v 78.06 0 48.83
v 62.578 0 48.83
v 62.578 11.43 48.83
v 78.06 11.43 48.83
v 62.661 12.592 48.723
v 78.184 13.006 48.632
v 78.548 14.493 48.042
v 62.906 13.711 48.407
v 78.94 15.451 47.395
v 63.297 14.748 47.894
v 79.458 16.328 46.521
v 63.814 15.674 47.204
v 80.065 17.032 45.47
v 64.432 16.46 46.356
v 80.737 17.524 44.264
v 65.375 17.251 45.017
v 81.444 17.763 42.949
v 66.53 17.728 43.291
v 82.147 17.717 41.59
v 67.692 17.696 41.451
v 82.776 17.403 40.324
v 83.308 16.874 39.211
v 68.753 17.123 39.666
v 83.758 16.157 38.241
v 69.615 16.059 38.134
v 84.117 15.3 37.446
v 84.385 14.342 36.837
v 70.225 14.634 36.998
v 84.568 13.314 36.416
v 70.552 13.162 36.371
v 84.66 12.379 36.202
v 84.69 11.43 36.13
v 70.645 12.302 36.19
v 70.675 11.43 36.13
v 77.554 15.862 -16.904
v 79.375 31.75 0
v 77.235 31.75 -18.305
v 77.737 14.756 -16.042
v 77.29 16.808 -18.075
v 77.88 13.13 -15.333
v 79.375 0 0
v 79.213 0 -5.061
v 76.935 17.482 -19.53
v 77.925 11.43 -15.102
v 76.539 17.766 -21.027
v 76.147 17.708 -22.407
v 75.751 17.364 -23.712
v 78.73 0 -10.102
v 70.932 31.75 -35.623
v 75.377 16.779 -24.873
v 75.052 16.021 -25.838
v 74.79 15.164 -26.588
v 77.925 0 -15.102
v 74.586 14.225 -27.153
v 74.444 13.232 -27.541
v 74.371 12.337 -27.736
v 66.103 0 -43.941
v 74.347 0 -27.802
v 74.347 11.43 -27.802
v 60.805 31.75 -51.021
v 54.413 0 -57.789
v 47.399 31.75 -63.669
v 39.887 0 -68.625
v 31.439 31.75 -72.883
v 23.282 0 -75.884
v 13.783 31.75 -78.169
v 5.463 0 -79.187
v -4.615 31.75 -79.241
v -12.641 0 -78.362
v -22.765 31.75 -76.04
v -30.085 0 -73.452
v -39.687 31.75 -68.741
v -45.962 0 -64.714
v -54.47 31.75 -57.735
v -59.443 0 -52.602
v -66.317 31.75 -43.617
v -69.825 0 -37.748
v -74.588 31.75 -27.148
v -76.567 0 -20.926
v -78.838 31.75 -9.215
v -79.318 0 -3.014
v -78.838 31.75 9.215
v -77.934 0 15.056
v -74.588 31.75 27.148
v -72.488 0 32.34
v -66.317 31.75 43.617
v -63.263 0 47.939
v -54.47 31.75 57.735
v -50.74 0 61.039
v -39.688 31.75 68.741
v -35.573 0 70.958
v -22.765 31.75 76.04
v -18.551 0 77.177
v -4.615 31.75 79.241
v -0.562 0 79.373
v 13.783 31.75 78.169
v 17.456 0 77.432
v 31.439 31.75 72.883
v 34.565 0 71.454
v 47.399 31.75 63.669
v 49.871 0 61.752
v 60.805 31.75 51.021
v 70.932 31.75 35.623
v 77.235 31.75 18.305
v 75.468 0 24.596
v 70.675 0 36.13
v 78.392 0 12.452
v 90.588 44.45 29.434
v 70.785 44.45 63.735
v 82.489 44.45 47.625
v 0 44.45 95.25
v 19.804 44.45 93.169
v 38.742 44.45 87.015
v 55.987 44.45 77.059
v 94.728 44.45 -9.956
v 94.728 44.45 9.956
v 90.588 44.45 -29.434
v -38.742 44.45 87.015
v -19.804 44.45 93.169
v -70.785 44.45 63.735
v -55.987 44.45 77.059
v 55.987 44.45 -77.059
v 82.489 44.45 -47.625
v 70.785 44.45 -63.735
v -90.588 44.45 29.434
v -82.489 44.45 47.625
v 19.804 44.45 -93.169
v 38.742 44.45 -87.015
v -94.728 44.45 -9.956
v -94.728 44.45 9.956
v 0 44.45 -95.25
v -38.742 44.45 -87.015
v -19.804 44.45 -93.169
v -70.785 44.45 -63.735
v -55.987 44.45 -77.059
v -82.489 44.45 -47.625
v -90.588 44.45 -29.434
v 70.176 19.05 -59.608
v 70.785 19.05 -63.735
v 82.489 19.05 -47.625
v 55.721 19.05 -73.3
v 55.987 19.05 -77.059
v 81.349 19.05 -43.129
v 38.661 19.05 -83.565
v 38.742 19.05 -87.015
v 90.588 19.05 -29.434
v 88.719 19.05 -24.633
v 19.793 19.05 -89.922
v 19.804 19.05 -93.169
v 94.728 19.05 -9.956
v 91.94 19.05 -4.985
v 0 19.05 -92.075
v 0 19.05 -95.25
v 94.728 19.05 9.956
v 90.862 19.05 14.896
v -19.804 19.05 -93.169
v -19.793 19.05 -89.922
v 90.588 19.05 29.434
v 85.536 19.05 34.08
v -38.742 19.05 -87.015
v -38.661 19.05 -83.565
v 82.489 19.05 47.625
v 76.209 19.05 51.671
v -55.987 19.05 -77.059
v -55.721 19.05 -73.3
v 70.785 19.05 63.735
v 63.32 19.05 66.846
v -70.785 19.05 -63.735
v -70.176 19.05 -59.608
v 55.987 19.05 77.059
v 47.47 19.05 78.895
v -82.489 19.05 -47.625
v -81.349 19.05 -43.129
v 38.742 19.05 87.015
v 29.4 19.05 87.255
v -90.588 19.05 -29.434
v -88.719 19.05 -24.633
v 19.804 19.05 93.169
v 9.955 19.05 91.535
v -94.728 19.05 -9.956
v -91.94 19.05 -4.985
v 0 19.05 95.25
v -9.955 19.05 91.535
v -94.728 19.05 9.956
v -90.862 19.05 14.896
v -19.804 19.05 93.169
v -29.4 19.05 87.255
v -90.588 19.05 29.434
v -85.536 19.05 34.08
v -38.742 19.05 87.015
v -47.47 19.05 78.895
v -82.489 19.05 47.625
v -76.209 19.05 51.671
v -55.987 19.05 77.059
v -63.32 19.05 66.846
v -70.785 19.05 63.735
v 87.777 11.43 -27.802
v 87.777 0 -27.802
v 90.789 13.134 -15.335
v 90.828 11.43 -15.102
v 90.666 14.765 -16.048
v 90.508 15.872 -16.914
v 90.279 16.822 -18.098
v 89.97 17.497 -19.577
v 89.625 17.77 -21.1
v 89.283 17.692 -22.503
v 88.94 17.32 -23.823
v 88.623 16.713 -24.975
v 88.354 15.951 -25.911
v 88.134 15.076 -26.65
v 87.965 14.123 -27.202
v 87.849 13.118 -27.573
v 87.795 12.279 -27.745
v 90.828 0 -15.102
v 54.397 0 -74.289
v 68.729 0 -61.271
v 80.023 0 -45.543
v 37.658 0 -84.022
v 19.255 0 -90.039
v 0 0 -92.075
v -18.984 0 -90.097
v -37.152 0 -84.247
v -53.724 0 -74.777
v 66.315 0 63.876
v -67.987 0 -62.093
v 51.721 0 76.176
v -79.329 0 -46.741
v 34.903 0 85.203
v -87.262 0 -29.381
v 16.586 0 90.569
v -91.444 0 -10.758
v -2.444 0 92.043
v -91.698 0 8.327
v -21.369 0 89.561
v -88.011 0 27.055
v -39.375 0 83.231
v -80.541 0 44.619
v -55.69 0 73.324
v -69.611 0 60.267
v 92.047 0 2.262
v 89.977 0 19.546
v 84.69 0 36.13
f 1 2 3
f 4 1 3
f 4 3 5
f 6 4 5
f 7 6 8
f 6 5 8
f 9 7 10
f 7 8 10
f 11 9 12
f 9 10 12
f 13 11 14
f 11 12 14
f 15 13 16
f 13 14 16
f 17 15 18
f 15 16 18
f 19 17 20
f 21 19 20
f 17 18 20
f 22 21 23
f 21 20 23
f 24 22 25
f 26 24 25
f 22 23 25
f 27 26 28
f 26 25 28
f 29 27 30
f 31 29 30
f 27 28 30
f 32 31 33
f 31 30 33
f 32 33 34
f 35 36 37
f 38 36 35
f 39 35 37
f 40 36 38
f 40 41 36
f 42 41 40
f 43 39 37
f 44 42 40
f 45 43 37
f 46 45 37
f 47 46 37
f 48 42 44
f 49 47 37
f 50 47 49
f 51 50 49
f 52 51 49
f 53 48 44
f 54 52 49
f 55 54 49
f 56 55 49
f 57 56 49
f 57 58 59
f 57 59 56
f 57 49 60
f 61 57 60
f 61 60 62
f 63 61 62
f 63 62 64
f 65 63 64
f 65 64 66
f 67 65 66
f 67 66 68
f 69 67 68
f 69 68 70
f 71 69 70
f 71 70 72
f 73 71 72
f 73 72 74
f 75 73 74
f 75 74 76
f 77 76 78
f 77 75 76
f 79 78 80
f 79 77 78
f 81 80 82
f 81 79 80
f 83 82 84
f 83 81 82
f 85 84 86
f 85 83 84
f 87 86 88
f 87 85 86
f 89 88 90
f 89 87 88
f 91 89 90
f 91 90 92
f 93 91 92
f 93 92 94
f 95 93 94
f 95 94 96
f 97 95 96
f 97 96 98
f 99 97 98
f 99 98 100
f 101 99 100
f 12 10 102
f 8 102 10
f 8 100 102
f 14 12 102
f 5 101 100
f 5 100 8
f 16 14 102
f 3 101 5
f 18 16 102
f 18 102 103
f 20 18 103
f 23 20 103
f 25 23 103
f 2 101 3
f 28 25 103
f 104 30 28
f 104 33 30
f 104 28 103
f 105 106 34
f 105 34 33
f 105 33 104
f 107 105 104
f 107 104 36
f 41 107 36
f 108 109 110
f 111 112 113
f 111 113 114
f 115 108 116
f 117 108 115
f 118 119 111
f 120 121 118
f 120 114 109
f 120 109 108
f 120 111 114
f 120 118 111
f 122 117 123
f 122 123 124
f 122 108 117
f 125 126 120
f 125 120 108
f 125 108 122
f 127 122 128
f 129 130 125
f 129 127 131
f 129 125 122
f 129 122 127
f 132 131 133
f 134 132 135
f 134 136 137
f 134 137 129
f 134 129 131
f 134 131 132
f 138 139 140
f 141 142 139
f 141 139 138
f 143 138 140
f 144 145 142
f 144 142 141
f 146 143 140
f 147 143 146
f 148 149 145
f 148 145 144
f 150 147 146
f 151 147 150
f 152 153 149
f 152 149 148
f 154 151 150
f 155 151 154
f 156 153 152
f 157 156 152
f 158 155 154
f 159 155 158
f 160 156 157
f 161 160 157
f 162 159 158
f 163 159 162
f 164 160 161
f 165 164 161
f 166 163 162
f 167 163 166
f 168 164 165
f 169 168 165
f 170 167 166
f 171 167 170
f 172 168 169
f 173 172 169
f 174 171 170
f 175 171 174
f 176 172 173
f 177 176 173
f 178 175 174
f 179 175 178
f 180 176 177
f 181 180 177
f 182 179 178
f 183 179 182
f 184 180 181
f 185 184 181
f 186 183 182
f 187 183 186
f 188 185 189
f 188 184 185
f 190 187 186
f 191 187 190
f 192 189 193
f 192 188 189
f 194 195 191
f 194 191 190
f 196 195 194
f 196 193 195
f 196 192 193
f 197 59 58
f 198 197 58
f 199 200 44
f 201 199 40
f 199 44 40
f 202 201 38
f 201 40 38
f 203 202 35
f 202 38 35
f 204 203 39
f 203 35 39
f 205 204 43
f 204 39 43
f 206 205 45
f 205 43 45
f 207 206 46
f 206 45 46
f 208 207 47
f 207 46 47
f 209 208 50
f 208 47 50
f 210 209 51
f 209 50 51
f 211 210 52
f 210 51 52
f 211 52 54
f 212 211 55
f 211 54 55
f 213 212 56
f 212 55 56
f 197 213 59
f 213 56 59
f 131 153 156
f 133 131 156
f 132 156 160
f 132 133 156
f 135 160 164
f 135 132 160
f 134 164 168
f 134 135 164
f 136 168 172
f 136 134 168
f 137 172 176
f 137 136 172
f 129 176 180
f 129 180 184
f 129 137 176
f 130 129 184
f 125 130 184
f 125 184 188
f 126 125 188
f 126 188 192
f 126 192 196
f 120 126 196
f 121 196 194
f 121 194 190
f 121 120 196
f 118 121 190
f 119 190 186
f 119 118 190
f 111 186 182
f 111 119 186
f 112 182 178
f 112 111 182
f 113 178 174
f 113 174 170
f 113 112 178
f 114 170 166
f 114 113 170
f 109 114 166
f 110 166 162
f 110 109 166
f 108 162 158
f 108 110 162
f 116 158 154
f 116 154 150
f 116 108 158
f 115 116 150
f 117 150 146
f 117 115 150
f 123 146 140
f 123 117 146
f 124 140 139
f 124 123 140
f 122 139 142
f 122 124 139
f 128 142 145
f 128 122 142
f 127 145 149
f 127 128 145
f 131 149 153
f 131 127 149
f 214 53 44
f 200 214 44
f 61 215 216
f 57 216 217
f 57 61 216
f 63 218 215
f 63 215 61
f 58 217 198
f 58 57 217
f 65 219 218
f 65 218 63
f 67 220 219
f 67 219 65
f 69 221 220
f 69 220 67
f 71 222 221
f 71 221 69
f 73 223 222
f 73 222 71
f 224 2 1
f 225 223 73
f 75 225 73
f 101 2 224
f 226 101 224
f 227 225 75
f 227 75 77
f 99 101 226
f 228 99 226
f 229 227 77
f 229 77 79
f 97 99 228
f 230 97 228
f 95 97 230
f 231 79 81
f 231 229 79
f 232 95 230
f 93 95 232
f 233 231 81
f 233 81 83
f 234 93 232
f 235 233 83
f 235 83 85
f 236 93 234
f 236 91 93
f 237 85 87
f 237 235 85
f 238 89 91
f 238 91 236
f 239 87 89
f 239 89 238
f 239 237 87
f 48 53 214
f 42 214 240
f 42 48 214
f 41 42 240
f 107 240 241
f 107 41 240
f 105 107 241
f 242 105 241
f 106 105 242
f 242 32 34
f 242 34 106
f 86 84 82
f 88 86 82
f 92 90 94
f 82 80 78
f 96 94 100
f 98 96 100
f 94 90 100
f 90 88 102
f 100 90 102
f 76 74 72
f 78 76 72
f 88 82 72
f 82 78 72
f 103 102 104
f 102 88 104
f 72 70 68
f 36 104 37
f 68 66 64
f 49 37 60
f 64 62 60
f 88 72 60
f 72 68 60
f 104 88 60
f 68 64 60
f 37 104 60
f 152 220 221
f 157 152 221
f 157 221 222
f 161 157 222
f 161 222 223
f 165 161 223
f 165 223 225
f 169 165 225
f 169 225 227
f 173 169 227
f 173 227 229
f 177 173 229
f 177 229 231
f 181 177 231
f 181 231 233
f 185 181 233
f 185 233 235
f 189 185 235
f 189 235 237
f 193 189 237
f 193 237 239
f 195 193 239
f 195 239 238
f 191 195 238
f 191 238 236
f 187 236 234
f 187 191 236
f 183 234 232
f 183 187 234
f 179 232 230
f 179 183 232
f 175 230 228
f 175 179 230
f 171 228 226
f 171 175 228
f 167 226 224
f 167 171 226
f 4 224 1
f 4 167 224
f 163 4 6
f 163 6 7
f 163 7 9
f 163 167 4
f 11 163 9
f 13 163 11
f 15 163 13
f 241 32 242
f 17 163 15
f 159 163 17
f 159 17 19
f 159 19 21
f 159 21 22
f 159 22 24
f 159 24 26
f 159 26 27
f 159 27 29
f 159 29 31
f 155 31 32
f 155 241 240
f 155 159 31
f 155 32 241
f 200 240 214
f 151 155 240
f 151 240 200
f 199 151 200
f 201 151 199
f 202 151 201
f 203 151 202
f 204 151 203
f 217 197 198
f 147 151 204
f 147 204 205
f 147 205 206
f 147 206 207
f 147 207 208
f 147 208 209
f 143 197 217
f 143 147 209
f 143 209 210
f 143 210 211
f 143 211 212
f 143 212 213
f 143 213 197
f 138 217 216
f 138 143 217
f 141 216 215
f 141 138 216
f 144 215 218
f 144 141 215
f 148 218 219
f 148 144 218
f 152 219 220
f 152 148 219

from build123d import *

# Parameters (mm, degrees)
SHELL1_OUTLINE_R        = 79.375
SHELL1_DEPTH            = 31.75
CUT_EXTRUDE2_REACH      = 143.848
CUT_EXTRUDE2_END_RADIUS = 92.075


# Read off the part's stored shape, not the designer's step: Shell1
with BuildPart() as part:
    # Sketch1 → Revolve1 (revolve)
    with BuildSketch(Plane.XY, mode=Mode.PRIVATE) as revolve1_sk:
        Polygon((0, 0), (92.075, 0), (92.075, 19.05), (95.25, 19.05), (95.25, 44.45), (0, 44.45), align=None)
    revolve(revolve1_sk.sketch.rotate(Axis((0, 0, 0), (0, 1, 0)), 90), axis=Axis((0, 0, 0), (0, 1, 0)))

    # Shell1 outline → Shell1 (cut)
    with BuildSketch(Plane(origin=(0, 0, 0), x_dir=(1, 0, 0), z_dir=(0, 1, 0))):
        Circle(SHELL1_OUTLINE_R)
    extrude(amount=SHELL1_DEPTH, mode=Mode.SUBTRACT)

    # Cut-Extrude2: up to this cylinder (the profile starts inside it)
    cut_extrude2_end = Plane(origin=(0, 0, 0), z_dir=(0, -1, 0)) * Cylinder(CUT_EXTRUDE2_END_RADIUS, 472.846, mode=Mode.PRIVATE)
    # Sketch2 → Cut-Extrude2 (cut, up to the surface)
    with BuildSketch(Plane(origin=(0, 0, 0), x_dir=(0, 0, -1), z_dir=(1, 0, 0)), mode=Mode.PRIVATE) as cut_extrude2_sk1:
        with BuildLine():
            Line((-48.830201285, -11.43), (-48.830201285, 11.43))
            ThreePointArc((-48.830201285, 11.43), (-42.480201285, 17.78), (-36.130201285, 11.43))
            Line((-36.130201285, 11.43), (-36.130201285, -11.43))
            ThreePointArc((-36.130201285, -11.43), (-42.480201285, -17.78), (-48.830201285, -11.43))
        make_face()
    cut_extrude2_tool1 = extrude(cut_extrude2_sk1.sketch, amount=CUT_EXTRUDE2_REACH, mode=Mode.PRIVATE) & cut_extrude2_end
    add(cut_extrude2_tool1.solids().sort_by_distance((0, 0, 42.480201))[0], mode=Mode.SUBTRACT)
    # Sketch2 → Cut-Extrude2 (cut, up to the surface)
    with BuildSketch(Plane(origin=(0, 0, 0), x_dir=(0, 0, -1), z_dir=(1, 0, 0)), mode=Mode.PRIVATE) as cut_extrude2_sk2:
        with BuildLine():
            Line((15.101598715, -11.43), (15.101598715, 11.43))
            ThreePointArc((15.101598715, 11.43), (21.451598715, 17.78), (27.801598715, 11.43))
            Line((27.801598715, 11.43), (27.801598715, -11.43))
            ThreePointArc((27.801598715, -11.43), (21.451598715, -17.78), (15.101598715, -11.43))
        make_face()
    cut_extrude2_tool2 = extrude(cut_extrude2_sk2.sketch, amount=CUT_EXTRUDE2_REACH, mode=Mode.PRIVATE) & cut_extrude2_end
    add(cut_extrude2_tool2.solids().sort_by_distance((0, 0, -21.451599))[0], mode=Mode.SUBTRACT)


solid = part.part
